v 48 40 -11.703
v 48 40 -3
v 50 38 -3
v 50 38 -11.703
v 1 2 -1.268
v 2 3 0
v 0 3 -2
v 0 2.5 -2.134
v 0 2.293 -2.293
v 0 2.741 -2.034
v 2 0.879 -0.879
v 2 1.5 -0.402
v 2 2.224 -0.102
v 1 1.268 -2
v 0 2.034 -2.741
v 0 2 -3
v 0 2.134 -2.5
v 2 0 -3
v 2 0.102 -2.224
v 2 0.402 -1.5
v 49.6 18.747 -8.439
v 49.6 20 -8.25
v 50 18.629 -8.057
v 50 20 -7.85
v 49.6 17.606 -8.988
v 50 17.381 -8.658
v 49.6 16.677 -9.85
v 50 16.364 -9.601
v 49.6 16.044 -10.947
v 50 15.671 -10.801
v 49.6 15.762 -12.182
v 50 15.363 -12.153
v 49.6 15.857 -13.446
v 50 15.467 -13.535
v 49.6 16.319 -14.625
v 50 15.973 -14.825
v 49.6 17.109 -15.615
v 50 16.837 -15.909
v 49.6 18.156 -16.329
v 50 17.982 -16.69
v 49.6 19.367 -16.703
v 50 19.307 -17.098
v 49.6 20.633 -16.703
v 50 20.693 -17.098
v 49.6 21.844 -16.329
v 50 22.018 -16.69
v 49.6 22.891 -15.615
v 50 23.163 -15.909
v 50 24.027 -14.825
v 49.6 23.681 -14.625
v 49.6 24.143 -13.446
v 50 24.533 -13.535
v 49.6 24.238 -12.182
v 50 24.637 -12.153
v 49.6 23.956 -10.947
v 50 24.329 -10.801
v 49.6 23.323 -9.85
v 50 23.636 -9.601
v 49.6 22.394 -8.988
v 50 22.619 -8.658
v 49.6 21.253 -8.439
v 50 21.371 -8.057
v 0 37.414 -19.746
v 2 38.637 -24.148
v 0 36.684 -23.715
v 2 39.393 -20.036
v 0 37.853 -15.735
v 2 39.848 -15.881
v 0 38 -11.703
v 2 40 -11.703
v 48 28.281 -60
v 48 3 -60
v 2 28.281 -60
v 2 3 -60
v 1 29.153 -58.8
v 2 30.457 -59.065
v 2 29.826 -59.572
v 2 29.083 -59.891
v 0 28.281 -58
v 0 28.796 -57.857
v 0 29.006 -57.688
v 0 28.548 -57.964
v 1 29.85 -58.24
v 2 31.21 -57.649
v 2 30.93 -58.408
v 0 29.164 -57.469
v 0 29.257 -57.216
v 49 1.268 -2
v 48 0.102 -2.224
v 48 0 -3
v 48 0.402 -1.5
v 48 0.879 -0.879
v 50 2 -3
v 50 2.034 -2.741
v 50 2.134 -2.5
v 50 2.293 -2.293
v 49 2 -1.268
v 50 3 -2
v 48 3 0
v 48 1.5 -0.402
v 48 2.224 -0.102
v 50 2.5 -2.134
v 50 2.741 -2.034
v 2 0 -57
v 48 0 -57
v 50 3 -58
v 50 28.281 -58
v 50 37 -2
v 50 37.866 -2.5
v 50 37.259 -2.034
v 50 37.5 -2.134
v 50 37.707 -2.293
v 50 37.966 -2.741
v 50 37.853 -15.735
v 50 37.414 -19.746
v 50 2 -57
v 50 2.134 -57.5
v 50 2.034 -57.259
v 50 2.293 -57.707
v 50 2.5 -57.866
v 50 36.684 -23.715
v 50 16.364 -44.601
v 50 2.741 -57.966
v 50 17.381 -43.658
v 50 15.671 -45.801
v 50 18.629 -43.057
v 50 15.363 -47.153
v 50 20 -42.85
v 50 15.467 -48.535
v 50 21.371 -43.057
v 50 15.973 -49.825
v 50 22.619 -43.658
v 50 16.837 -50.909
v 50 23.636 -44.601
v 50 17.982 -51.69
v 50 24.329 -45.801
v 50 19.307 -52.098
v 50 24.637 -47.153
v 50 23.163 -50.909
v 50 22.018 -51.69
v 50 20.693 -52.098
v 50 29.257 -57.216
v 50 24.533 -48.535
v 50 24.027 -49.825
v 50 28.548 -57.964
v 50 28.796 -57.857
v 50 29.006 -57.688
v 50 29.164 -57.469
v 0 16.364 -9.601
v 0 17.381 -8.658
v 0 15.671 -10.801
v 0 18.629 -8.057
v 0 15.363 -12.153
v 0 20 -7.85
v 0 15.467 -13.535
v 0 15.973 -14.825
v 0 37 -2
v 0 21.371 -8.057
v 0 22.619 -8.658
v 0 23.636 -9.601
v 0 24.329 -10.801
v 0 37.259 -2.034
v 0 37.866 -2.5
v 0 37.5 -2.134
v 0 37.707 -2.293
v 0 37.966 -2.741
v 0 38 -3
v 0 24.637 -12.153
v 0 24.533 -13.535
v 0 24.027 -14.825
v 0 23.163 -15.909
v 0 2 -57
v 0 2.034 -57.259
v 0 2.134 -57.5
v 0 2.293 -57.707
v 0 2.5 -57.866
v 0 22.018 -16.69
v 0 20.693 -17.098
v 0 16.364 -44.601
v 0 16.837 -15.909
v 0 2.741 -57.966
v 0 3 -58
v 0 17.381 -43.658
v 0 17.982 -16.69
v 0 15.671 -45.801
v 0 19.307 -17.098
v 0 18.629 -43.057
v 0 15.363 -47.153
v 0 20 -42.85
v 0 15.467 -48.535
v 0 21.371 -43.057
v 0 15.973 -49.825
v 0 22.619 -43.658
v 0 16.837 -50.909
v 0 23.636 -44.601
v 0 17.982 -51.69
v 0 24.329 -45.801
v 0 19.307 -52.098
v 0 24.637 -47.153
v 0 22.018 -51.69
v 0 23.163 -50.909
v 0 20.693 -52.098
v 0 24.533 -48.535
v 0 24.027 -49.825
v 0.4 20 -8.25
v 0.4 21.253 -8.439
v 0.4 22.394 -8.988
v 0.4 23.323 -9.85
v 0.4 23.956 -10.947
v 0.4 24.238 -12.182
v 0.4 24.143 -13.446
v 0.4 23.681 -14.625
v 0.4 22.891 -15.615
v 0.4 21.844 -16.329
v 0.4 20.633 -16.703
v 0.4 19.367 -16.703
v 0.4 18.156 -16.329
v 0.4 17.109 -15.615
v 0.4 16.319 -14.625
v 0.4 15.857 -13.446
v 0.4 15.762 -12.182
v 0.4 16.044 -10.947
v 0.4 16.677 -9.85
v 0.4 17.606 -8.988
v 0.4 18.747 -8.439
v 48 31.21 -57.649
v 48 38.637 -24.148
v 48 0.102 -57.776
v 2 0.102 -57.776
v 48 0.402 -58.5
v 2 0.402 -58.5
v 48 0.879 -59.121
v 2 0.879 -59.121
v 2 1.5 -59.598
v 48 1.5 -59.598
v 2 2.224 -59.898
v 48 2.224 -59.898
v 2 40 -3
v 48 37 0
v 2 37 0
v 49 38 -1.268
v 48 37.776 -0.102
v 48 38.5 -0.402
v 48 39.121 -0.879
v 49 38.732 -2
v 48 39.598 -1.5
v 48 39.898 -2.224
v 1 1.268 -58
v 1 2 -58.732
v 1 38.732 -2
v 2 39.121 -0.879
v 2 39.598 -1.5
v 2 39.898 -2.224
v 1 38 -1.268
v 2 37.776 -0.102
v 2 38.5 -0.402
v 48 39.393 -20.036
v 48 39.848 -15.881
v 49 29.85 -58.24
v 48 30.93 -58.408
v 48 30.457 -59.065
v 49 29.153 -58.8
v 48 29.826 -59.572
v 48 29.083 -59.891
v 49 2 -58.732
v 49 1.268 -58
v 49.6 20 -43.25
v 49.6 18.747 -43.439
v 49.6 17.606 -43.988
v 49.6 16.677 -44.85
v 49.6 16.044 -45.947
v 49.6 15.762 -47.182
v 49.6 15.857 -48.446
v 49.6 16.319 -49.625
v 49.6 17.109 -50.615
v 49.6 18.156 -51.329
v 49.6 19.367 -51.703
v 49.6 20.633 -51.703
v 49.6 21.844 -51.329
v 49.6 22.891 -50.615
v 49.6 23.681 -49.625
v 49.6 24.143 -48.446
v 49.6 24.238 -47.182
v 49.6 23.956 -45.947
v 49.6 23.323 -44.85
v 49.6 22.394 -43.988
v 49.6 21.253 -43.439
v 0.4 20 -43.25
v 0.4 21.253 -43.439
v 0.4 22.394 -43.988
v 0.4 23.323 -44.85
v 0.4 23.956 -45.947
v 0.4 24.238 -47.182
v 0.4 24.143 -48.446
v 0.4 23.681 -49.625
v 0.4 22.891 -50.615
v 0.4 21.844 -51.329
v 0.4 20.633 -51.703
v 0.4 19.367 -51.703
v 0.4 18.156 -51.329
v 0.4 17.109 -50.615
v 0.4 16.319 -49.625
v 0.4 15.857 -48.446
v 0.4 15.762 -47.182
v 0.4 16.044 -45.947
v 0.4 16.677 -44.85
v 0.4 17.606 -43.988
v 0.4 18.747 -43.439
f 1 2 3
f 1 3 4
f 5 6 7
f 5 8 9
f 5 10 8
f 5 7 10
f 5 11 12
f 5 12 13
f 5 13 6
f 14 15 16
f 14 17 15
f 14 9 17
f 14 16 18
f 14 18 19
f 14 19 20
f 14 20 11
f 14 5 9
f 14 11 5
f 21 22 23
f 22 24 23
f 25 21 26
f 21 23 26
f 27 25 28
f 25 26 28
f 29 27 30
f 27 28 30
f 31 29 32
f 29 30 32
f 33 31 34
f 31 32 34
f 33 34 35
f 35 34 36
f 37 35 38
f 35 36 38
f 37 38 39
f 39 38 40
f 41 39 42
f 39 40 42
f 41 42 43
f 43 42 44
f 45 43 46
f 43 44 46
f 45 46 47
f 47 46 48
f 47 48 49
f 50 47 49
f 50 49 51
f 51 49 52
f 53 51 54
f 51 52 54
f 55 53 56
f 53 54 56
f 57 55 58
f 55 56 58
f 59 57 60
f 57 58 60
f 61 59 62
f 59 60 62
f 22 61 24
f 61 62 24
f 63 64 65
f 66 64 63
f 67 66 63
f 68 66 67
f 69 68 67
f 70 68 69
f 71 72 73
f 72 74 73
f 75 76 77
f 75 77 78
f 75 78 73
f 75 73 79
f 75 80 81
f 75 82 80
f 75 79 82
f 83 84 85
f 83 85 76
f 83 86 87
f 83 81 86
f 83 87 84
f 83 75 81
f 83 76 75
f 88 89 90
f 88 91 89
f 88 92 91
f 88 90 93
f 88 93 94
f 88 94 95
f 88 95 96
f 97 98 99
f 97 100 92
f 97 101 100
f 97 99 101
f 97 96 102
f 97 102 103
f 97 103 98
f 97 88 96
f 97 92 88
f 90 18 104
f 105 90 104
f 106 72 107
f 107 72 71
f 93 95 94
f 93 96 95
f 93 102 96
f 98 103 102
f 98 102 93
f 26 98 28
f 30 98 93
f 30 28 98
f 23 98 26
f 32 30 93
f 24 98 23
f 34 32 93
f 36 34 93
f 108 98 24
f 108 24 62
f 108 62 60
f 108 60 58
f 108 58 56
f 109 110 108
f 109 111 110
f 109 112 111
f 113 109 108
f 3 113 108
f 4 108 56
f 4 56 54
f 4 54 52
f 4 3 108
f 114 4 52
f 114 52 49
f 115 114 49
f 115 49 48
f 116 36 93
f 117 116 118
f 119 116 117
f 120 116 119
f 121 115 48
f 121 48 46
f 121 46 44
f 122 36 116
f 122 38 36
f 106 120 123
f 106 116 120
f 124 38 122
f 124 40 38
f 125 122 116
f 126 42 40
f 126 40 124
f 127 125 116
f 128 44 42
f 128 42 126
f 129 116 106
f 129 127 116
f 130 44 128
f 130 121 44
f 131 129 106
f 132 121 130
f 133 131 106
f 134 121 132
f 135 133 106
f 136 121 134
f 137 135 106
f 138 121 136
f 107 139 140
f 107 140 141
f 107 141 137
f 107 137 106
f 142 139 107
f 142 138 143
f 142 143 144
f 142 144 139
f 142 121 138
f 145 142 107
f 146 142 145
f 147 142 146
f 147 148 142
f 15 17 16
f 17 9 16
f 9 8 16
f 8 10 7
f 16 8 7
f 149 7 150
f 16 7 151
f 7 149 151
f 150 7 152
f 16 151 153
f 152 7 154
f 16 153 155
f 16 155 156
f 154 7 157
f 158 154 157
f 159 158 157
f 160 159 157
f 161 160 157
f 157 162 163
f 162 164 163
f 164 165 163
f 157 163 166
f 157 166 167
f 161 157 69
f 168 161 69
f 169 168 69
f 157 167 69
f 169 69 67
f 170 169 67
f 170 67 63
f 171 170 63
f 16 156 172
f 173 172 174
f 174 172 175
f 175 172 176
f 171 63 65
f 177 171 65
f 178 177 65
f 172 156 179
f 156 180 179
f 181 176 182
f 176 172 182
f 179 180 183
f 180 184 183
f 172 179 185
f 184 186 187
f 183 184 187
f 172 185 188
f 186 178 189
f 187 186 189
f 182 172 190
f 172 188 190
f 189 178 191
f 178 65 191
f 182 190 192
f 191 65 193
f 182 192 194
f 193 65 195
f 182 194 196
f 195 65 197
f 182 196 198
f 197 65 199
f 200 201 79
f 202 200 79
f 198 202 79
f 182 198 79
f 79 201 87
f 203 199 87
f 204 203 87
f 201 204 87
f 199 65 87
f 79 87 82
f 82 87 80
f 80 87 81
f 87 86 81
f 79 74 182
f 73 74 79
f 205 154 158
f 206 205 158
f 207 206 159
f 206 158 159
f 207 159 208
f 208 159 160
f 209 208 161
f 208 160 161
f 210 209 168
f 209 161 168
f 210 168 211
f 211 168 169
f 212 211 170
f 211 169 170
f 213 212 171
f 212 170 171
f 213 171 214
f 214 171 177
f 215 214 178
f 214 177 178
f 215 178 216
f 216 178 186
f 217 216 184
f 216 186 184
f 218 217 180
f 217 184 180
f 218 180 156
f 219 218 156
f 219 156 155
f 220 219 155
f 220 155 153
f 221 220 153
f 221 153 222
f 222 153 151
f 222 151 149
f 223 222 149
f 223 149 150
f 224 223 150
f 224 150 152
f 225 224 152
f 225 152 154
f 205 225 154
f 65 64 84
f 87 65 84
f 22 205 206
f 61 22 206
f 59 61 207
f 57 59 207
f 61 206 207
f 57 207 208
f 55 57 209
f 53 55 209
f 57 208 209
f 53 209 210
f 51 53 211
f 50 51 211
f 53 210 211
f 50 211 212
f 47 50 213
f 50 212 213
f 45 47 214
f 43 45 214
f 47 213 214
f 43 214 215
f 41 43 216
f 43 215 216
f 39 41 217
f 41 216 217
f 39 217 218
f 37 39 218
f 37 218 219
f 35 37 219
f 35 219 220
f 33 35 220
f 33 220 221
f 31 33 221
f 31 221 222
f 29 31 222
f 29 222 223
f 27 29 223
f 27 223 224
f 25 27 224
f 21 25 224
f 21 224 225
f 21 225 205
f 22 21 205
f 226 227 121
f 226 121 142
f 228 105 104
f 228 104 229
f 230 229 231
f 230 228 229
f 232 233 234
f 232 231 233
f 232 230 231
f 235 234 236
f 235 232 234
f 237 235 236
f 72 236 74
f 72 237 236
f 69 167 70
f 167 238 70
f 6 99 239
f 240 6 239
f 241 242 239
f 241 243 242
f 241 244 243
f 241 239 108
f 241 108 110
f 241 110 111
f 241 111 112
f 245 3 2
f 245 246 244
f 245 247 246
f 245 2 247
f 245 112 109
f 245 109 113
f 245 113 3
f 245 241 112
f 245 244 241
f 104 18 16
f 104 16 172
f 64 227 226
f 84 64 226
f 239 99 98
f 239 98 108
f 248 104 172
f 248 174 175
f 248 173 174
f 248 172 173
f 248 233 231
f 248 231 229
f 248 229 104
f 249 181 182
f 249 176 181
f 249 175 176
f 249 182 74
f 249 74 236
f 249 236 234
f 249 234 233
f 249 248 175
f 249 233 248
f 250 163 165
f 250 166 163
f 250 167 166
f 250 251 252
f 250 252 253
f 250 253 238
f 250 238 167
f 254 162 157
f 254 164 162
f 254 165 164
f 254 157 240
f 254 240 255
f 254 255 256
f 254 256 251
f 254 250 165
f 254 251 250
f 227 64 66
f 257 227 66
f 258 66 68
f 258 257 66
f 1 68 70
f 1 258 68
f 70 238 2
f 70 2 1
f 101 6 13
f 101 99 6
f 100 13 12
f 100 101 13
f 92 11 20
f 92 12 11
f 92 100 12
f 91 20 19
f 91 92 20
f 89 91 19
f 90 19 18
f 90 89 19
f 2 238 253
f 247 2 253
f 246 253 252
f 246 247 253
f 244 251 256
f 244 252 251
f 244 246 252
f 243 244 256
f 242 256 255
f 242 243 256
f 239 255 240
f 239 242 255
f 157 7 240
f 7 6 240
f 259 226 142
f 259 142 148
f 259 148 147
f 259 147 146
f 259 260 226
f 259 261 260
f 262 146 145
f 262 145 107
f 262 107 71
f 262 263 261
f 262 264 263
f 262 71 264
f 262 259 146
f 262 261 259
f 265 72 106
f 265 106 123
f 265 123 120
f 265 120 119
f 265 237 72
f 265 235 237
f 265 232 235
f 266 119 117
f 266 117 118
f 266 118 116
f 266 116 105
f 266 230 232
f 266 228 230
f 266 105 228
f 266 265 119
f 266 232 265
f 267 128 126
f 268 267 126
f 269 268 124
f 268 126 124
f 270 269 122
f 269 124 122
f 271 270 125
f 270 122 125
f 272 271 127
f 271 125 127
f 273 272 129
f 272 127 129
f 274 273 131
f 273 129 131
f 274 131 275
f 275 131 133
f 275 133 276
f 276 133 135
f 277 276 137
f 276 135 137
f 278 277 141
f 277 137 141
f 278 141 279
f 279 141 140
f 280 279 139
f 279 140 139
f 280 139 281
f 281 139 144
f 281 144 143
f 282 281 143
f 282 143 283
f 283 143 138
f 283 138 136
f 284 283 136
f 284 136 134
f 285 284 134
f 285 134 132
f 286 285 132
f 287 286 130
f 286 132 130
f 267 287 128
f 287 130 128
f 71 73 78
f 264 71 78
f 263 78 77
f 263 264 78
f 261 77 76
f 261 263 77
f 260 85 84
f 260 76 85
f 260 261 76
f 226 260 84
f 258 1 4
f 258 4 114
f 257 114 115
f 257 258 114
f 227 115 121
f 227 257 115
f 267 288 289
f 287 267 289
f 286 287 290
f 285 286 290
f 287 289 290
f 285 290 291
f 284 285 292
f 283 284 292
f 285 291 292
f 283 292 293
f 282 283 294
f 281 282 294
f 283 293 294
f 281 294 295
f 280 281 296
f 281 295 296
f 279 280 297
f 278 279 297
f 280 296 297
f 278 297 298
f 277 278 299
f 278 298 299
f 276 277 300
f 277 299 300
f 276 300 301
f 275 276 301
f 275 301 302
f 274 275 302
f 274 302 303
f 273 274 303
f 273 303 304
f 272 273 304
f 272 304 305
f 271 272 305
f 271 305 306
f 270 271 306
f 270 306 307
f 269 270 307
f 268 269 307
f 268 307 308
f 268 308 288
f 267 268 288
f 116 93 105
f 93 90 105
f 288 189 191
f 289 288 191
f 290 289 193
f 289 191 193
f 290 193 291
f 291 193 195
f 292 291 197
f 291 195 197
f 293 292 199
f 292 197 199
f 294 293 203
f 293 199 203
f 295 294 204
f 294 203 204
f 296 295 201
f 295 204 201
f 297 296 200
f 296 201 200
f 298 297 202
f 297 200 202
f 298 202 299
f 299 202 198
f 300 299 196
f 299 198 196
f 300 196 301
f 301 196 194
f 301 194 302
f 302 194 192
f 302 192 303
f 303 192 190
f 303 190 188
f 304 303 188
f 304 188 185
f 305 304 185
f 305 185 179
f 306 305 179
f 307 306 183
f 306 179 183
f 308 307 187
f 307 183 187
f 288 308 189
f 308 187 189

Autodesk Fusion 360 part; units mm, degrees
sketch "Sketch1" plane through (0, 0, 0) normal (1, 0, 0) x (0, 0, -1)
  line L0 (0, 0) -> (0, 40)
  line L1 (0, 40) -> (18, 40)
  line L2 (18, 40) -> (60, 30.6888)
  line L3 (0, 0) -> (60, 0)
  line L4 (60, 0) -> (60, 30.6888)
  dimension "d1" = 40
  dimension "d2" = 18
  dimension "d3" = 12.5
  dimension "d4" = 60
extrude "Extrude1" add sketch "Sketch1" along normal blind 50 makes body 1
sketch "Sketch2" plane through (0, 0, 0) normal (-1, 0, 0) x (0, 0, 1)
  line L0 (-60, 0) -> (0, 0)
  line L1 (0, 0) -> (0, 40)
  line L2 (0, 40) -> (-18, 40)
  line L3 (-18, 40) -> (-60, 30.6888)
  line L4 (-60, 30.6888) -> (-60, 0)
  circle A0 centre (-47.5, 20) radius 4.25
  line L5 (-60, 20) -> (0, 20) construction
  circle A1 centre (-12.5, 20) radius 4.25
  circle A2 centre (-47.5, 20) radius 7.25
  circle A3 centre (-12.5, 20) radius 7.25
  dimension "d9" = 8.5
  dimension "d12" = 12.5
  dimension "d13" = 12.5
  dimension "d14" = 14.5
  dimension "d15" = 20
extrude "Extrude2" cut sketch "Sketch2" against normal blind 63 contours A0 | A1 bodies 1
fillet "Fillet1" radius 57.5 1 edges at (25, 40, -18) on bodies 1
fillet "Fillet1" radius 3 4 edges at (25, 30.6888, -60) (25, 40, 0) (25, 0, 0) (25, 0, -60) on bodies 1
chamfer "Chamfer1" distance 0.4 angle 45 2 faces at (16.6667, 19.5768, -8.2711) (16.6667, 19.5768, -43.2711) on bodies 1
chamfer "Chamfer1" distance 2 angle 45 10 faces at (16.6667, 36.1613, -35.3151) (16.6667, 28.9517, -59.9241) (33.3333, 11.427, -60) (16.6667, 1.1455, -59.3582) (33.3333, 0, -21) (16.6667, 0.0034, -2.8573) (16.6667, 14.3333, 0) (16.6667, 38.3747, -0.3335) (16.6667, 40, -5.9009) (16.6667, 39.5782, -18.6549) on bodies 1
copy_body "Body->Comp1" bodies 1 removing the originals makes body 2 in component "bumper block"
component "bumper block" placed x (1, 0, 0) y (0, 1, 0) z (0, 0, 1) at (0, 0, 0)
